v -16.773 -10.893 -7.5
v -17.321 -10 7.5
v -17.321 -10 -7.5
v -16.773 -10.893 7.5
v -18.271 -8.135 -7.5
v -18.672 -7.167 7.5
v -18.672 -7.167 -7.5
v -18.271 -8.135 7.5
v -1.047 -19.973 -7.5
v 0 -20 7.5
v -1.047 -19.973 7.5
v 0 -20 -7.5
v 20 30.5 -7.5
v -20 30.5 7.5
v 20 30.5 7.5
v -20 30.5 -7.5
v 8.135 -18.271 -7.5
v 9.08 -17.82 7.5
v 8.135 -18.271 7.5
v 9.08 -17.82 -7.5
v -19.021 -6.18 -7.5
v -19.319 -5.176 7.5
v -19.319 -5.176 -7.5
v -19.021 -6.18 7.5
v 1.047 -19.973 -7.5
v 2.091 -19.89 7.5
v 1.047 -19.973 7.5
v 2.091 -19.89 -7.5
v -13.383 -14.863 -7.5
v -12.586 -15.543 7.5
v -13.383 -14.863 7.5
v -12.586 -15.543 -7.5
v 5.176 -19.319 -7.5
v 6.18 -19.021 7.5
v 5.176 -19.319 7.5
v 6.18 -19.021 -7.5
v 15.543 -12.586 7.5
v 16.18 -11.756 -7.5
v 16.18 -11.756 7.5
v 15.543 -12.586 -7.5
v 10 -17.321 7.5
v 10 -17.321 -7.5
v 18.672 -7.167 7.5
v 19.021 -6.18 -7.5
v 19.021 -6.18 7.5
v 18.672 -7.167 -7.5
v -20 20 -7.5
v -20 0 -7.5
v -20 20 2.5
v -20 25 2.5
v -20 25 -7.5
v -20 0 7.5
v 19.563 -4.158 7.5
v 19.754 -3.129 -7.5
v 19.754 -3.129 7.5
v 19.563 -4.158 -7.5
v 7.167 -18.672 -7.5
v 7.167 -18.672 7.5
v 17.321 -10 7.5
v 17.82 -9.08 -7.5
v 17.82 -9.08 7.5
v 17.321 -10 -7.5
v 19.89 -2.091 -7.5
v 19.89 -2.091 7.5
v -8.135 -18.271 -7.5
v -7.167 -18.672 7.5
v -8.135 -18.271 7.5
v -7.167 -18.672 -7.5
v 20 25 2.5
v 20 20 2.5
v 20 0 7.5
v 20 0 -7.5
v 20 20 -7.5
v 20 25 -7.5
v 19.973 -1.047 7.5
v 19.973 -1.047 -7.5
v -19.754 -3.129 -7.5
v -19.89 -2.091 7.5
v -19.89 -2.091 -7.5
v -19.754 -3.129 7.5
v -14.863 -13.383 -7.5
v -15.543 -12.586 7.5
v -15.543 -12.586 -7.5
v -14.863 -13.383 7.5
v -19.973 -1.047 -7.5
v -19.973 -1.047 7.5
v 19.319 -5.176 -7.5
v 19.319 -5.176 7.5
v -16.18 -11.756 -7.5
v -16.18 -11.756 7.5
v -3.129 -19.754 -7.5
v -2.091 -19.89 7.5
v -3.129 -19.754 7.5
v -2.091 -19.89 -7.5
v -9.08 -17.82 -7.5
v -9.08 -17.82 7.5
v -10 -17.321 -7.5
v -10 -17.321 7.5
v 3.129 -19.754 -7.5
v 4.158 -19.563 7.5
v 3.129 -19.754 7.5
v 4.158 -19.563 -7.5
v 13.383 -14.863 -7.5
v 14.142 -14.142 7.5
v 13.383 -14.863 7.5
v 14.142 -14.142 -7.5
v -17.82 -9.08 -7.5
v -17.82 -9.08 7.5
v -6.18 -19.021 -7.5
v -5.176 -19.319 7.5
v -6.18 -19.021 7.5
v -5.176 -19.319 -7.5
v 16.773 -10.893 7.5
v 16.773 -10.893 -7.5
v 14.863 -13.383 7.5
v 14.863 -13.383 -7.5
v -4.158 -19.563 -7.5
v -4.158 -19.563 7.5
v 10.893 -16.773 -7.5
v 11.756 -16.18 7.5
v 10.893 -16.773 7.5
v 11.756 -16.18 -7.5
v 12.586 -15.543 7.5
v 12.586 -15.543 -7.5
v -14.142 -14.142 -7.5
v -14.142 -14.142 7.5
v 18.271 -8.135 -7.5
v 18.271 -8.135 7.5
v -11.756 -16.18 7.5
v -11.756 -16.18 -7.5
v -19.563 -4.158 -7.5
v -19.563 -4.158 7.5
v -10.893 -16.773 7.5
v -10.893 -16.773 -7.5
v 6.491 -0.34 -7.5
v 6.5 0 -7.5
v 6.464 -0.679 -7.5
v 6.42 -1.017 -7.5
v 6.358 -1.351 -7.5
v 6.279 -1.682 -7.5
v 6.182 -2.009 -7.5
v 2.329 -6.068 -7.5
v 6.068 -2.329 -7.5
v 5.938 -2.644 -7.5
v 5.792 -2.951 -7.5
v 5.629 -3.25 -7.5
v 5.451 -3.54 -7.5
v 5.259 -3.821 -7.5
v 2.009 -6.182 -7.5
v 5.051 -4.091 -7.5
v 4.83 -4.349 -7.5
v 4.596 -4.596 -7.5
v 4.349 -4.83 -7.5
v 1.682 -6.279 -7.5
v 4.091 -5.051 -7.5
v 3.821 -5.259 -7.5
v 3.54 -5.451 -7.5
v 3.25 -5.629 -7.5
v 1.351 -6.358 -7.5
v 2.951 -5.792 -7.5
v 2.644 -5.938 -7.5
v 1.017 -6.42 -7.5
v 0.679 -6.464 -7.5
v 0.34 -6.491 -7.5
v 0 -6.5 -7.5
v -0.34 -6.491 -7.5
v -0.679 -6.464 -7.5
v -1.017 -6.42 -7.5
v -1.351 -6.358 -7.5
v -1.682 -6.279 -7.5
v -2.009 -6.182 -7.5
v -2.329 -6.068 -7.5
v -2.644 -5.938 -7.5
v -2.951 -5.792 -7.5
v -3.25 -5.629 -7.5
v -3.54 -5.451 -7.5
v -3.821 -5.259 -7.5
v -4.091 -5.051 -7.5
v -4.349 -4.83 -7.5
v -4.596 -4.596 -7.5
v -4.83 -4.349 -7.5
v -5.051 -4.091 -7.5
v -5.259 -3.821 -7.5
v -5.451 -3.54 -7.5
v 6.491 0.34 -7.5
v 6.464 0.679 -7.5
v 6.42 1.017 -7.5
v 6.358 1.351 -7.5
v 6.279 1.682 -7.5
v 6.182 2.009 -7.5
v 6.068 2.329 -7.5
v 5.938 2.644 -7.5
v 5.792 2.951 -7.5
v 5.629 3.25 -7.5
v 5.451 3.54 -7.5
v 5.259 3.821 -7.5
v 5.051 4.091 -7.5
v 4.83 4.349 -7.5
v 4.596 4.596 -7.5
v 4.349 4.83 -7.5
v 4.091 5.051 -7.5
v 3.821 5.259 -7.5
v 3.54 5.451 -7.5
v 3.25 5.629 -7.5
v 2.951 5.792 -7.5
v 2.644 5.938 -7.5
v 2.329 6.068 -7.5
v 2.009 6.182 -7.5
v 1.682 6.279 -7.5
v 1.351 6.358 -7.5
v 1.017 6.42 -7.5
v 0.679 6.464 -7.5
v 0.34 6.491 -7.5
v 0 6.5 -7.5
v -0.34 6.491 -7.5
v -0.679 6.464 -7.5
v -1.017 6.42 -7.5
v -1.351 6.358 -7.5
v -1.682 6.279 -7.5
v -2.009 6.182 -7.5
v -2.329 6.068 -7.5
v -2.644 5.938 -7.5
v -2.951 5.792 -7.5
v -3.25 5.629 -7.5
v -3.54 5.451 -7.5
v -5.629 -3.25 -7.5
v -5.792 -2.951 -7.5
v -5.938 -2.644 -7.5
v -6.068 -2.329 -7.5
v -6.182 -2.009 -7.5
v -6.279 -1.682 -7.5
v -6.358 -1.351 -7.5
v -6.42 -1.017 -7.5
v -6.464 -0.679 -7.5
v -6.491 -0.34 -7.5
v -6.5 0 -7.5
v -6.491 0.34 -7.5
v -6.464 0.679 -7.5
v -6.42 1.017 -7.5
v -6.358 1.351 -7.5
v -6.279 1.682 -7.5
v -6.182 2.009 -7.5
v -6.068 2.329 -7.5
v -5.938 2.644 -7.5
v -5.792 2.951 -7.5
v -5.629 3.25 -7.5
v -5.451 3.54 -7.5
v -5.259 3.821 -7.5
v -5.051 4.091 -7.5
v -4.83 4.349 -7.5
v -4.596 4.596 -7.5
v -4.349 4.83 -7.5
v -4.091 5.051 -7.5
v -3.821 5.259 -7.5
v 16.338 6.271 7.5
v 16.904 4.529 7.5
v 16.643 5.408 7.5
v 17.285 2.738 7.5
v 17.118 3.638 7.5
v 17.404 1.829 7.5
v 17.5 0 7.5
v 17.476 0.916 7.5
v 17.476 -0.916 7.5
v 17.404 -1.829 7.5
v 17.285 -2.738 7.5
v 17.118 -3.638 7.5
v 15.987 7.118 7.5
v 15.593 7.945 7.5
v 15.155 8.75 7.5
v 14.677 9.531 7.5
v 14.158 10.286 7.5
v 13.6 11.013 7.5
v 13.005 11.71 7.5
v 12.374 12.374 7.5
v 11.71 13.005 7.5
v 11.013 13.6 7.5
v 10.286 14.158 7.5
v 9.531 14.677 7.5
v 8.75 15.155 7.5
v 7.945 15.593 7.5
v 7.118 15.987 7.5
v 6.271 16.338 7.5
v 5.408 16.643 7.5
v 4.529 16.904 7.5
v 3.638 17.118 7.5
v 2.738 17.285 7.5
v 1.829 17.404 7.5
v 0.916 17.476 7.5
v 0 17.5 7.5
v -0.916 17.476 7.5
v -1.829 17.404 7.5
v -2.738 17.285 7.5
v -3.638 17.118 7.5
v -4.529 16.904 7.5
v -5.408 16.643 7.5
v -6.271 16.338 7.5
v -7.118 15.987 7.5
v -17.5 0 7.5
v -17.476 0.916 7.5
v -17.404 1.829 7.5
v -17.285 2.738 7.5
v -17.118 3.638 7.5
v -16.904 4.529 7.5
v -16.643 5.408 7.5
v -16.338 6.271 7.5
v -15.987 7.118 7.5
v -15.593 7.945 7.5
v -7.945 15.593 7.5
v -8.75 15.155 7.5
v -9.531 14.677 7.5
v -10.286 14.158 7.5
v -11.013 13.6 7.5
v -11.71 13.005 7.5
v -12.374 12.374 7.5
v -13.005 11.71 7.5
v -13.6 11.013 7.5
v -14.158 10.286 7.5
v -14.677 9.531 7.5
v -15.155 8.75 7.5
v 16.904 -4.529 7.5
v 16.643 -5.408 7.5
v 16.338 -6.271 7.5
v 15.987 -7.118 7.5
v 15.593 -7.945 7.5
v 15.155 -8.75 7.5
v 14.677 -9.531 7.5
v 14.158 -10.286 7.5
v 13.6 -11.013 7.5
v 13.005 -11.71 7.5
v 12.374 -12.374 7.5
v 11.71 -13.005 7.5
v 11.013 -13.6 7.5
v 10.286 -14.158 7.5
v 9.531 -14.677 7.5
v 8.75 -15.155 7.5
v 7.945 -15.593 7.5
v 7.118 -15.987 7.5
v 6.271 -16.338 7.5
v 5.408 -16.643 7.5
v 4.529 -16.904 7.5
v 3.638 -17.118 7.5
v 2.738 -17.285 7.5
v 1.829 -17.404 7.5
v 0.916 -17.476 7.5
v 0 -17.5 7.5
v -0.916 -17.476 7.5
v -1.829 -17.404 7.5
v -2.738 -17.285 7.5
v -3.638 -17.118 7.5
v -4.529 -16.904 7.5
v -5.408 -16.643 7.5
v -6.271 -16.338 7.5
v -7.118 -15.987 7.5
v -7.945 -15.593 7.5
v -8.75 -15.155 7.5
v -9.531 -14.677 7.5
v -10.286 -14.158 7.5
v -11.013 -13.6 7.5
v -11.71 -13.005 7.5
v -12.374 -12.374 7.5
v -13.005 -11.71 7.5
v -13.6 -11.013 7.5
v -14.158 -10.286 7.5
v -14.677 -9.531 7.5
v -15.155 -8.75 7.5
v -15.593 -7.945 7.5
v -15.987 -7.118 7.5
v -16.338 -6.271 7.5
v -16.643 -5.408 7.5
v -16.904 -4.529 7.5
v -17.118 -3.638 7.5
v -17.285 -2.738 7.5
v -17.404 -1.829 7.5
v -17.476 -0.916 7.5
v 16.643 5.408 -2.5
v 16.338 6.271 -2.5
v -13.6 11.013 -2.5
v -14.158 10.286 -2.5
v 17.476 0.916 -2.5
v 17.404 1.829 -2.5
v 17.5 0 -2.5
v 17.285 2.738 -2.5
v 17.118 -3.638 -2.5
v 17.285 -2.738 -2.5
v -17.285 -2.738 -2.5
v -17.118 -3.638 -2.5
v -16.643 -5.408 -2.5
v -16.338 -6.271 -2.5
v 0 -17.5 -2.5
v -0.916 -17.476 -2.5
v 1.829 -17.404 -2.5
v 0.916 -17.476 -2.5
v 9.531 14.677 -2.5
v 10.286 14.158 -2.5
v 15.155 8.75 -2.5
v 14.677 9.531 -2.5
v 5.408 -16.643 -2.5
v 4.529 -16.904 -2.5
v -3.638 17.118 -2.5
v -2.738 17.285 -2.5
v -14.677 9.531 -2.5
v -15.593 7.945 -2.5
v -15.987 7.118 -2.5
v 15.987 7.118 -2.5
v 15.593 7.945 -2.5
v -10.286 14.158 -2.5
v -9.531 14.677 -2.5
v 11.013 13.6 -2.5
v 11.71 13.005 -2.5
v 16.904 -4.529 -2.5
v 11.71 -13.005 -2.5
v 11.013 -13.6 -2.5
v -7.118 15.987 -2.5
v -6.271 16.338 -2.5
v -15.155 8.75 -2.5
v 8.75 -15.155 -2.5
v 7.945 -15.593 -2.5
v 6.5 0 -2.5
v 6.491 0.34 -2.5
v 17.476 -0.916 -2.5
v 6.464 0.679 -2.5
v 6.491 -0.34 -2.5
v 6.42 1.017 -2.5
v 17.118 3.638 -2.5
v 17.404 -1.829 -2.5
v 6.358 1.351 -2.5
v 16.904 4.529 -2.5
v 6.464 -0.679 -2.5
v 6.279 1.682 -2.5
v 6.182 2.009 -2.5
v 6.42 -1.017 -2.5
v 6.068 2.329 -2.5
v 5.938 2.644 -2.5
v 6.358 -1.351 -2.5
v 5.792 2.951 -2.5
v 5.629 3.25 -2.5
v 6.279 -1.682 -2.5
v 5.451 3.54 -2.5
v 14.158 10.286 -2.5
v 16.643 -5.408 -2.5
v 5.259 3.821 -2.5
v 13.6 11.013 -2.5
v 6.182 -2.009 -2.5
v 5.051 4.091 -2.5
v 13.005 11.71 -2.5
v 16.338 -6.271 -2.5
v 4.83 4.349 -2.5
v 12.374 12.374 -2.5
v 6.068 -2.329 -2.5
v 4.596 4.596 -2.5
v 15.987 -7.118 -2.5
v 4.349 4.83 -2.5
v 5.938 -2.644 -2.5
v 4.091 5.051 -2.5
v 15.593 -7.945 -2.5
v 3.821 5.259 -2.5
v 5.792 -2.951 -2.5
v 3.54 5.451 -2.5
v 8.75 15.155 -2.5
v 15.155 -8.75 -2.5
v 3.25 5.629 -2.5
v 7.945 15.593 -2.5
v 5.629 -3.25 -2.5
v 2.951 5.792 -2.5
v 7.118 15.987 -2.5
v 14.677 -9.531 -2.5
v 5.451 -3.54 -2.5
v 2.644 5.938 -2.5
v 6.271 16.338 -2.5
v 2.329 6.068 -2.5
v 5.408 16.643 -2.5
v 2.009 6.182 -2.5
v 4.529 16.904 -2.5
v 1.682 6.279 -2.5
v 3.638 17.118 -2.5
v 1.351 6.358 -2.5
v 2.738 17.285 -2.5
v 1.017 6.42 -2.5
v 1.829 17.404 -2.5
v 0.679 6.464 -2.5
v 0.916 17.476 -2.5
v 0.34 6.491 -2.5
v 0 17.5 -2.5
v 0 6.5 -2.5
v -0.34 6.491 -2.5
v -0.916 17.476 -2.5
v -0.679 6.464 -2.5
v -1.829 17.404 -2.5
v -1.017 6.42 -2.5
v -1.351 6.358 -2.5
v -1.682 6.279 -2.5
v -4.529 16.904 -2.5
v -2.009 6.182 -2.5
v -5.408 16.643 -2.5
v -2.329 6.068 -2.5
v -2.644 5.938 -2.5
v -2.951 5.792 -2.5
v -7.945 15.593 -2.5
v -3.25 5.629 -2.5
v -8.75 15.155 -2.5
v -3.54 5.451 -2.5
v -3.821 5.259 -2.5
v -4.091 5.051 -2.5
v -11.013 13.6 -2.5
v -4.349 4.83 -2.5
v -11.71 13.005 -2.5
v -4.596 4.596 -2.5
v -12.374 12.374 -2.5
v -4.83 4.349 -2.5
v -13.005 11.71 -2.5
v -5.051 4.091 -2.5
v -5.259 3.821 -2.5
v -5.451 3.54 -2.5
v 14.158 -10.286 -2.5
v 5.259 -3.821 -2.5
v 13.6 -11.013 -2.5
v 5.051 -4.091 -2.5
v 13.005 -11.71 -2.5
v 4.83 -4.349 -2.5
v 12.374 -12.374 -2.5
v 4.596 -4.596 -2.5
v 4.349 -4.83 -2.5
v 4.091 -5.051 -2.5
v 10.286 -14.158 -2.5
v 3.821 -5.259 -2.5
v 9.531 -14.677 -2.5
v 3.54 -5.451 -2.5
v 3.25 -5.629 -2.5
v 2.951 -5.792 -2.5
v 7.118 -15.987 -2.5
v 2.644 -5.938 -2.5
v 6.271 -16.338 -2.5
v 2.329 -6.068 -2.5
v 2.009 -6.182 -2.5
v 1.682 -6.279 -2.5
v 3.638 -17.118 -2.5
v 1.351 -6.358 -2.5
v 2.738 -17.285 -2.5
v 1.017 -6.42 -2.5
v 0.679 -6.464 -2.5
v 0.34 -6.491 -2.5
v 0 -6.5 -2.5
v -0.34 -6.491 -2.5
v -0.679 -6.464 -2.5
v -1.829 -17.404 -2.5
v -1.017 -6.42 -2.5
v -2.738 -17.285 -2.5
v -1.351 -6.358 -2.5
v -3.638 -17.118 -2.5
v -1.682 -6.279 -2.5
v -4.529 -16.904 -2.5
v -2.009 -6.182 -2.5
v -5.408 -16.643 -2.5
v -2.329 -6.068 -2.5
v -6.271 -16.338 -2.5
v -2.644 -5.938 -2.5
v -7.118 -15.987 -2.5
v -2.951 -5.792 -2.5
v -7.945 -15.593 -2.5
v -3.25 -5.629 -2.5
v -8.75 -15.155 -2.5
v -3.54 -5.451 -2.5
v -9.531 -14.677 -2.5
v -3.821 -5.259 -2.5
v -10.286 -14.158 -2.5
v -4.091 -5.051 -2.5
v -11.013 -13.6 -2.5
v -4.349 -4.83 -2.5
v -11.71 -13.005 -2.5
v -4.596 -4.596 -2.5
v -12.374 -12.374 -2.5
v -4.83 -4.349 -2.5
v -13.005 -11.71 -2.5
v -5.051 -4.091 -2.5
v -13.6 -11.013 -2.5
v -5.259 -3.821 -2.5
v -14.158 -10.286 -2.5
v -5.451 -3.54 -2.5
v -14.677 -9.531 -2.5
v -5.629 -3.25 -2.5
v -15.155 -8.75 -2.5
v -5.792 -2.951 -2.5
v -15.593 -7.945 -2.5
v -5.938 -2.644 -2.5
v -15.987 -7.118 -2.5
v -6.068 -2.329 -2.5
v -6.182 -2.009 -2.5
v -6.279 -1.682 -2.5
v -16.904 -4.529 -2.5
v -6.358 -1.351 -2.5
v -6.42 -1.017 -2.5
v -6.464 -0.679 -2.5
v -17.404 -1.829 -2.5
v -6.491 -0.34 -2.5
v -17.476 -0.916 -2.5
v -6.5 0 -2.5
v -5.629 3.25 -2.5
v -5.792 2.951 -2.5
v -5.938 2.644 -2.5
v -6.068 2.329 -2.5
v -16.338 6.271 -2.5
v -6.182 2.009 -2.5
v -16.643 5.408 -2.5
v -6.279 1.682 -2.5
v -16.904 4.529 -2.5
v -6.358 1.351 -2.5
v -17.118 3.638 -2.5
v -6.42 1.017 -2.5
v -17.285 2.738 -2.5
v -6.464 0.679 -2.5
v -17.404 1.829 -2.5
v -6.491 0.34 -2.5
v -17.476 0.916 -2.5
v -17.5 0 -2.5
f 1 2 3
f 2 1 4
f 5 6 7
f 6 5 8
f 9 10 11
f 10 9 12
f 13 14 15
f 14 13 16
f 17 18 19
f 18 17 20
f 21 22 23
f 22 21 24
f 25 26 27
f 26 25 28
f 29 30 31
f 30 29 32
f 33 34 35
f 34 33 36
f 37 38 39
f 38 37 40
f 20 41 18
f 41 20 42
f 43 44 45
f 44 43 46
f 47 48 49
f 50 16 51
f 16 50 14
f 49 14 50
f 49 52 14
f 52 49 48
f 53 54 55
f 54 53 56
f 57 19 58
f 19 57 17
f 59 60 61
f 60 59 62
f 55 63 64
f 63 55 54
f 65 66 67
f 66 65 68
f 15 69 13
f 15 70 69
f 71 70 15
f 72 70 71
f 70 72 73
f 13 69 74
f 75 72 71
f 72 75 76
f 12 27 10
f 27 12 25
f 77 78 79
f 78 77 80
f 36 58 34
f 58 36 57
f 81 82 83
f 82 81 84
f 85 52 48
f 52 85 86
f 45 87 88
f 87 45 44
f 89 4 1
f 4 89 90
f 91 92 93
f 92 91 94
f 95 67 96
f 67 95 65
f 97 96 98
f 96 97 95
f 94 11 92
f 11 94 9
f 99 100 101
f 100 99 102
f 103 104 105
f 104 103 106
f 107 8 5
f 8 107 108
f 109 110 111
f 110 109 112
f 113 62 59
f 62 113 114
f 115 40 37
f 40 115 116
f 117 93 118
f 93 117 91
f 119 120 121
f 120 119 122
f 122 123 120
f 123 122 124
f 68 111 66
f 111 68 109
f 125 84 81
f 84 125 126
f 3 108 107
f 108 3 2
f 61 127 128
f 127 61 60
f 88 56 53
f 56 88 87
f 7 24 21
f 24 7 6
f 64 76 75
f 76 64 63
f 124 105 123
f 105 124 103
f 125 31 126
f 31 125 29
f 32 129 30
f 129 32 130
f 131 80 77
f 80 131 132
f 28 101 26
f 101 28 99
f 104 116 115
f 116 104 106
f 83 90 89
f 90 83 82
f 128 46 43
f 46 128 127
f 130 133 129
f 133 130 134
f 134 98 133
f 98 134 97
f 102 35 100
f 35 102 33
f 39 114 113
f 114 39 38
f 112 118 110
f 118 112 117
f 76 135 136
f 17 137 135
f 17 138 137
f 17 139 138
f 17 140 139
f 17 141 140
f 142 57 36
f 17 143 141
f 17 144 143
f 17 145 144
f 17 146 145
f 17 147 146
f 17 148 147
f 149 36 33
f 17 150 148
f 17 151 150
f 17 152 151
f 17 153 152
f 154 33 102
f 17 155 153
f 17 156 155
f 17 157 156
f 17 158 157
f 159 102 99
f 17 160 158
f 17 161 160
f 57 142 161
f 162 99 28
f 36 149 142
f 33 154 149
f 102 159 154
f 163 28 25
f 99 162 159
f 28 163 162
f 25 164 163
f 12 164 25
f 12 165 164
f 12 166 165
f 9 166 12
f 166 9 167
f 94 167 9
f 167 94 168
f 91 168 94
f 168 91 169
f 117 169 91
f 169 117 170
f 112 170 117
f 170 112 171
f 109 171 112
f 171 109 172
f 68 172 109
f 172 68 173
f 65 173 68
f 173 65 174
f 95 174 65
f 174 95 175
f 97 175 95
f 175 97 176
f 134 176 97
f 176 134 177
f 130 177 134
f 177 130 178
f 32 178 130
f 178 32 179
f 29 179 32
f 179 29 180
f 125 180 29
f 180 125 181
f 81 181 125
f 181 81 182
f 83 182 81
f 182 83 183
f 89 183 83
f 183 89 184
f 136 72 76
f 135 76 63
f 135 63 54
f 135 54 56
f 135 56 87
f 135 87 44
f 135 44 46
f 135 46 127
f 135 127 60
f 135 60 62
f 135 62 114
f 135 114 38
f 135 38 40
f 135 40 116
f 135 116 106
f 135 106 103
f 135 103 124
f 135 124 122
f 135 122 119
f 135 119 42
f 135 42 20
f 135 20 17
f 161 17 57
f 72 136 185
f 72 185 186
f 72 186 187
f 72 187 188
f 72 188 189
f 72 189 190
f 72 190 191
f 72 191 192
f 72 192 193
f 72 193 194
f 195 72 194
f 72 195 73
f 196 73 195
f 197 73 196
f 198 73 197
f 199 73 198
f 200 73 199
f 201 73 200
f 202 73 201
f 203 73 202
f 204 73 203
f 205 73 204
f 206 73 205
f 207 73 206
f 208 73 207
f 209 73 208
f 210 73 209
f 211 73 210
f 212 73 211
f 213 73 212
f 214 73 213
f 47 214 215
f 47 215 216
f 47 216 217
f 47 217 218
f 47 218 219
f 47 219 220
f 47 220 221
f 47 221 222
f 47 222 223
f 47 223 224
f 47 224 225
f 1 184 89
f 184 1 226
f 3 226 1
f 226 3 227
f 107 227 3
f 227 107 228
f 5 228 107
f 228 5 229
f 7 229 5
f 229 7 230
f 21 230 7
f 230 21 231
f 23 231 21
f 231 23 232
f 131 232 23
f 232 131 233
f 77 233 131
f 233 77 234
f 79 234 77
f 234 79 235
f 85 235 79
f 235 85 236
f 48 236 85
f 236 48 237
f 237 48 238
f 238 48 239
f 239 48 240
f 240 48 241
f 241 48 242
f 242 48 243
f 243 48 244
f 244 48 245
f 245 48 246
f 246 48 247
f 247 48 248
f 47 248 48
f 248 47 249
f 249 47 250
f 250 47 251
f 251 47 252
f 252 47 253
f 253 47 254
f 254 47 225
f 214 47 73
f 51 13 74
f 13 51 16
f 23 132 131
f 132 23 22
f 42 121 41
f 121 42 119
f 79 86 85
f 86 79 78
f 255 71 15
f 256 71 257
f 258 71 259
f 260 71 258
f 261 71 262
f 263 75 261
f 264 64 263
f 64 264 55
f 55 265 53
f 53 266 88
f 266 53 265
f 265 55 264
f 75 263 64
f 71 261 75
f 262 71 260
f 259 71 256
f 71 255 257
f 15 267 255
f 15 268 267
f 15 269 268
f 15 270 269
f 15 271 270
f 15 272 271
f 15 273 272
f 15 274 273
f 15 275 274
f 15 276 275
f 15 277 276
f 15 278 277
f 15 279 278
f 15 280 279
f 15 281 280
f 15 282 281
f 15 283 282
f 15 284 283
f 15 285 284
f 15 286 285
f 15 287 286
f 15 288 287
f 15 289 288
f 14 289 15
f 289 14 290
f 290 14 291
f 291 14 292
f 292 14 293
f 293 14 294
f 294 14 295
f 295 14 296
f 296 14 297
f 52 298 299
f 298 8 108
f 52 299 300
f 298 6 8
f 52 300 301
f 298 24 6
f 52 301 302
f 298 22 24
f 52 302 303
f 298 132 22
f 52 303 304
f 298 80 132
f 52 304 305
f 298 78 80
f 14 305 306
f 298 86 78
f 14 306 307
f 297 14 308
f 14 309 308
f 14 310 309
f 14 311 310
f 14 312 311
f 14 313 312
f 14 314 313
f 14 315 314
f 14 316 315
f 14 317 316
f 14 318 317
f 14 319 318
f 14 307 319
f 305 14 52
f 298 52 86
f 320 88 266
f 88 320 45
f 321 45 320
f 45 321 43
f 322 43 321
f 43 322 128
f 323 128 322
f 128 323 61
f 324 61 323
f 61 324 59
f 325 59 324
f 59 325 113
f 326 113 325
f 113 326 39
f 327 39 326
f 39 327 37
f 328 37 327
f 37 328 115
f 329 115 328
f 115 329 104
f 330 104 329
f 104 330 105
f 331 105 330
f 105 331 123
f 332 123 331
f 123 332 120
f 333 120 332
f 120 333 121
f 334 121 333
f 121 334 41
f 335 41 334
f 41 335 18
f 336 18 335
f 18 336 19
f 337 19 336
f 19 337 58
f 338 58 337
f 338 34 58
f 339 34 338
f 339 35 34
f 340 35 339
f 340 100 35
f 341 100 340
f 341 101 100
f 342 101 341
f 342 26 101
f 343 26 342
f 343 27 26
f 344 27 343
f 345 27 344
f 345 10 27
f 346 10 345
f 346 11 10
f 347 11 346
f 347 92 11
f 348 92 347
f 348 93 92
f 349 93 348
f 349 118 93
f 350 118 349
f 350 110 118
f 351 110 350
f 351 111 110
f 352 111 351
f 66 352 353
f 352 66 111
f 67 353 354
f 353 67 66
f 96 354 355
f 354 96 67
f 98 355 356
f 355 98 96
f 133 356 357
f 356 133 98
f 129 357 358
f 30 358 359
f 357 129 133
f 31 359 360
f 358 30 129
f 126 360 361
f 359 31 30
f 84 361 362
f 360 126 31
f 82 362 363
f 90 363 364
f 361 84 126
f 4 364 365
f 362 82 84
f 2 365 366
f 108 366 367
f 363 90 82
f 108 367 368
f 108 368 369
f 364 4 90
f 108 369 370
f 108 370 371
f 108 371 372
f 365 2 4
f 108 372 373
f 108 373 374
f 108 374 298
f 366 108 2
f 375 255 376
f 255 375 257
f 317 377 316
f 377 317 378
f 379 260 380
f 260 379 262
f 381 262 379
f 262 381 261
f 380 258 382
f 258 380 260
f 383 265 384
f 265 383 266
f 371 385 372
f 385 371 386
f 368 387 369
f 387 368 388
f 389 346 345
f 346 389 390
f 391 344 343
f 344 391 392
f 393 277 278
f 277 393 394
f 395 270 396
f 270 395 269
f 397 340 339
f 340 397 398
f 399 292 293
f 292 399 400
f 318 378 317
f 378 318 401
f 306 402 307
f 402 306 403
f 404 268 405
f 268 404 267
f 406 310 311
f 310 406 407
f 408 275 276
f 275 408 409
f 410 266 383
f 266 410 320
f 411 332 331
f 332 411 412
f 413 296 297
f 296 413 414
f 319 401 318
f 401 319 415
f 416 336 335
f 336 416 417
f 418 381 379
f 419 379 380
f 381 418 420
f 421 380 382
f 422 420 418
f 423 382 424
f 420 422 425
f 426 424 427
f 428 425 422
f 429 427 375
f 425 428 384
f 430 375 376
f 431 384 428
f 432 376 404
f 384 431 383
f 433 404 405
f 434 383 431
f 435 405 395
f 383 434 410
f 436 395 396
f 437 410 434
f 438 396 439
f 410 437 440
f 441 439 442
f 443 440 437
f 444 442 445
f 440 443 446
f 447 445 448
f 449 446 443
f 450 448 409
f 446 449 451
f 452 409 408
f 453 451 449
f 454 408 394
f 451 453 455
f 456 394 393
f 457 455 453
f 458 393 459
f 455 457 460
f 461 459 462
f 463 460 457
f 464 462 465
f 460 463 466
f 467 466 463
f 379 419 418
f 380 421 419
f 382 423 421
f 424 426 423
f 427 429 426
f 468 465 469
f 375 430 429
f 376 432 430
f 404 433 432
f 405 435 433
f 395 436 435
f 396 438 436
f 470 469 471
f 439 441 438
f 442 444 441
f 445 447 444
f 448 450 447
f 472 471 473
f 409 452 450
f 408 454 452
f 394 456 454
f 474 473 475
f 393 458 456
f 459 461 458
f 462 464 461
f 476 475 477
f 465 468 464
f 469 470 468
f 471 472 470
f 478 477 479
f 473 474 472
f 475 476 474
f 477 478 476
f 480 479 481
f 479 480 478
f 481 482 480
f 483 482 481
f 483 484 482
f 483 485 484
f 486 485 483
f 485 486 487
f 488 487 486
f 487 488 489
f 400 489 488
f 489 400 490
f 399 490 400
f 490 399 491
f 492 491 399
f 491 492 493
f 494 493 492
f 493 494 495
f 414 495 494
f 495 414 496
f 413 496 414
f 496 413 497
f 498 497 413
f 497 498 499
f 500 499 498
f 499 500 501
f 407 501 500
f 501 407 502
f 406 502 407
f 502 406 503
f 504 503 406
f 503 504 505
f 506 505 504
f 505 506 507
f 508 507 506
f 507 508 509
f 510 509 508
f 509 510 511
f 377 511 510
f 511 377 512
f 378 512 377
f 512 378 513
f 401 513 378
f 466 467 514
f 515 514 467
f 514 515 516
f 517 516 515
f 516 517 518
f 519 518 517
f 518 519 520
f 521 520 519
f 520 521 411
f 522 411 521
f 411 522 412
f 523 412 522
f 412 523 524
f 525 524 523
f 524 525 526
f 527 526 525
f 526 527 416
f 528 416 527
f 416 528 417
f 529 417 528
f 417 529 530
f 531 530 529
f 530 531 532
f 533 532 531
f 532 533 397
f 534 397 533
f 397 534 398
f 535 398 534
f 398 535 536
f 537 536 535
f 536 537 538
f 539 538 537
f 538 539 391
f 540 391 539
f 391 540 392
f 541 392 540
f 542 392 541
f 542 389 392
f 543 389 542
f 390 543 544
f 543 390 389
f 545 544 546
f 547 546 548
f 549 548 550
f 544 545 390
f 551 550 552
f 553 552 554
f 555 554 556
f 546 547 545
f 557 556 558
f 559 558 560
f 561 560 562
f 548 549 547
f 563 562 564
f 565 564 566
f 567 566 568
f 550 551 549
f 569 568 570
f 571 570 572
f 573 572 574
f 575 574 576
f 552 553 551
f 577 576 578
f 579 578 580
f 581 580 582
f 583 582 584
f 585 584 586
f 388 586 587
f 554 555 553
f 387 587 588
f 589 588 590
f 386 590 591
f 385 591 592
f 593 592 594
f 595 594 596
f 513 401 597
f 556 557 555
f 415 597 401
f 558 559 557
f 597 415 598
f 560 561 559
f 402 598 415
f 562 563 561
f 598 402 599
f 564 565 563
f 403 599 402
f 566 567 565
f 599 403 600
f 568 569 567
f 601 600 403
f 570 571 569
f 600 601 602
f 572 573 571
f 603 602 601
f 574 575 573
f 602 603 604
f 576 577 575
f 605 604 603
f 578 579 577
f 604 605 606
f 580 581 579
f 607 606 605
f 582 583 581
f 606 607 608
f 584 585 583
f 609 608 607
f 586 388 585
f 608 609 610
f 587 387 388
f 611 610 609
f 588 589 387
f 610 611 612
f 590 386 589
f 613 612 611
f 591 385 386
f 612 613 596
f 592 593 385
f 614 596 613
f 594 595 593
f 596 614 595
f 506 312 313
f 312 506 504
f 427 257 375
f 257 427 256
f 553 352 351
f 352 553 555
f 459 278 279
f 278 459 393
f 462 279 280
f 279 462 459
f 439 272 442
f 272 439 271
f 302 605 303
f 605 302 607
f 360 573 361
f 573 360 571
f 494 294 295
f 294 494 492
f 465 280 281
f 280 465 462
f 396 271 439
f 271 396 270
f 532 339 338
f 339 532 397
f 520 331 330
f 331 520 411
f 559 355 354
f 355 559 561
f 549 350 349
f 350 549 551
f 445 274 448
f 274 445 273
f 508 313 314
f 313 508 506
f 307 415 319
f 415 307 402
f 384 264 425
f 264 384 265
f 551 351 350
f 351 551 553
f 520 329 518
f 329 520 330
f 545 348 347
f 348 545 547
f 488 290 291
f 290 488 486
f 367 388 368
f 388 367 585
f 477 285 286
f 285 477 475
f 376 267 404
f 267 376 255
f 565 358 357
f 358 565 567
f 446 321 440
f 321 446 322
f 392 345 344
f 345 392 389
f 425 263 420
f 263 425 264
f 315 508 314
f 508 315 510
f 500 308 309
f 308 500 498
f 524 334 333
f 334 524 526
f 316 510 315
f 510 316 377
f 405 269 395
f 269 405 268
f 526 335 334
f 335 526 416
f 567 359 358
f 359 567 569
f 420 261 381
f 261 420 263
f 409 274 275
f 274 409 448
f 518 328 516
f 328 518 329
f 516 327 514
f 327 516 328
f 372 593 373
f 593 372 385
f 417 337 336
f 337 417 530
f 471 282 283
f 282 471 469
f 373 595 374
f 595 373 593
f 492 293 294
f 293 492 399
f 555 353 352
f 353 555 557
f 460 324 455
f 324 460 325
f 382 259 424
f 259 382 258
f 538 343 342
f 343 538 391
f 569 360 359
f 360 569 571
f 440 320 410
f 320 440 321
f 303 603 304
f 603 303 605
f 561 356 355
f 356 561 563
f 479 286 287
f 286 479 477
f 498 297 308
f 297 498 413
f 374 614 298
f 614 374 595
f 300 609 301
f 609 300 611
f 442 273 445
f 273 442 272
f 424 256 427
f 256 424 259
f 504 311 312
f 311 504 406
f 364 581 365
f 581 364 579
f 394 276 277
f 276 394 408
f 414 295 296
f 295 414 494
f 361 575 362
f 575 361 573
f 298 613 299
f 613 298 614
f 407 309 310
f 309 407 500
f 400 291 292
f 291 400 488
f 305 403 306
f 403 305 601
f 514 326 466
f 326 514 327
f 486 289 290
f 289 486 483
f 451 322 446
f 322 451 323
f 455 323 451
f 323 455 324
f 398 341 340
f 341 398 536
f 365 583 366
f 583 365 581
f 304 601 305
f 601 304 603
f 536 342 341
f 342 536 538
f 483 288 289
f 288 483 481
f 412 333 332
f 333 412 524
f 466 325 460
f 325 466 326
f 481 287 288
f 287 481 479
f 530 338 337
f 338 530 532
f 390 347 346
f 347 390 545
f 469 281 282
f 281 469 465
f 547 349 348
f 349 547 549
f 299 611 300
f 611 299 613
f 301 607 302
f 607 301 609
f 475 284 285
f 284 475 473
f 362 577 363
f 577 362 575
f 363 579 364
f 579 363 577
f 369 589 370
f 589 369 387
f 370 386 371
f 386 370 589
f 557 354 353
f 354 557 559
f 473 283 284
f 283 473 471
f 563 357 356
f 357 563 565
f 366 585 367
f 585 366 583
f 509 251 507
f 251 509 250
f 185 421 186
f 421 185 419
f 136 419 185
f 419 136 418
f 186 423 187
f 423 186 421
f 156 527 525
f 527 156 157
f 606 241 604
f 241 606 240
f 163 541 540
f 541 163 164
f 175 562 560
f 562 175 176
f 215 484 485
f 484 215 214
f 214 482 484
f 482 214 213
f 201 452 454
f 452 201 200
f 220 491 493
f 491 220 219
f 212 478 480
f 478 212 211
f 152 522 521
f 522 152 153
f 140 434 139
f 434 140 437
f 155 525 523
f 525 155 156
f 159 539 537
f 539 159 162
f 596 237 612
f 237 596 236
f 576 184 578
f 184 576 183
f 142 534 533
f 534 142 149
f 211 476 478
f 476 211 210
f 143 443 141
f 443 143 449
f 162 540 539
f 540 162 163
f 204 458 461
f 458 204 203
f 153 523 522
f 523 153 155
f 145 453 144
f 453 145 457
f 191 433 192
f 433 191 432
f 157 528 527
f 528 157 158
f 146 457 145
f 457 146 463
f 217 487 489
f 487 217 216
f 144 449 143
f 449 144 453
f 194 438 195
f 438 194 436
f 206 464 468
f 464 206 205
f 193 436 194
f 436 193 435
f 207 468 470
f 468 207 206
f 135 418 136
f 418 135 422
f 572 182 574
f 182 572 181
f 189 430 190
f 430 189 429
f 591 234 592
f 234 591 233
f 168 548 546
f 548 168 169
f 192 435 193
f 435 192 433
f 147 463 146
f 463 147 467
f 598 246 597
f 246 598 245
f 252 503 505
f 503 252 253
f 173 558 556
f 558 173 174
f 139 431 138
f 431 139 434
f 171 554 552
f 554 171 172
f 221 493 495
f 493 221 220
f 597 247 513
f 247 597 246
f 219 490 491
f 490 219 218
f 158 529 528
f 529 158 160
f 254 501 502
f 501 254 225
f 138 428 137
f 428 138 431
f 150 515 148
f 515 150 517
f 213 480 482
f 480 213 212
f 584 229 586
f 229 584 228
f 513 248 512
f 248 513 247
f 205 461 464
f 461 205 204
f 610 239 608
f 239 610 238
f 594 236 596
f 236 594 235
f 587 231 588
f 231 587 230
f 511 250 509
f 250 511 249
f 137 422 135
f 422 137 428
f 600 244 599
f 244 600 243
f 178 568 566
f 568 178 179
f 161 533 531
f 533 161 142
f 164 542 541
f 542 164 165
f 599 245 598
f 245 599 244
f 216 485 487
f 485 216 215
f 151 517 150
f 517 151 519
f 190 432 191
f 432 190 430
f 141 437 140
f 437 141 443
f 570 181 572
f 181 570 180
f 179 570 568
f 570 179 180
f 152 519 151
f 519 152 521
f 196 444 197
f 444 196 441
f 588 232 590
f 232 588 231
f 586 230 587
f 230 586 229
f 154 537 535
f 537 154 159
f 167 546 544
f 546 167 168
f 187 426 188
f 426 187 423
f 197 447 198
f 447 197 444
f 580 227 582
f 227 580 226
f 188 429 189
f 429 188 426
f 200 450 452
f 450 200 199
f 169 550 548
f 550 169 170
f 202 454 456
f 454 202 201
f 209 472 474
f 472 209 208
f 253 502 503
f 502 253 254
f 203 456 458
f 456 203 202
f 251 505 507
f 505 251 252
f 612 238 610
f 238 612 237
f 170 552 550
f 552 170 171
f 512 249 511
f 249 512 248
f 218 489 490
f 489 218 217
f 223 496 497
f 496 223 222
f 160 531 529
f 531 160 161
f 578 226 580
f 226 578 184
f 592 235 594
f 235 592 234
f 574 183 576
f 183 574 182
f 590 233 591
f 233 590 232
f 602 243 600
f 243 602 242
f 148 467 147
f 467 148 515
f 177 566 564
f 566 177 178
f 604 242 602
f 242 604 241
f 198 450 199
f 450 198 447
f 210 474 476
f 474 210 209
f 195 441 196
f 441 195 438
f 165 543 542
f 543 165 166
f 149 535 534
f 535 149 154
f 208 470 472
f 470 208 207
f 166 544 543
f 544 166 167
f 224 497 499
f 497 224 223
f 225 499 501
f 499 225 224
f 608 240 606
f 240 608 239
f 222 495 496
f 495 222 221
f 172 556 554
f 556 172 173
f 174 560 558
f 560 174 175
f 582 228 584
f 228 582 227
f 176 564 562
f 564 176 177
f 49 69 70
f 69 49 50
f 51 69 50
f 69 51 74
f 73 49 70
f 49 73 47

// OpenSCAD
$fn=120;

//spacer();
air_lock_holder();

module spacer(){
    difference(){
        cylinder(d=55, h=25, center=true);
        cylinder(d=38.5, h=27, center=true);
    }
}

module air_lock_holder(){
    difference(){
        hull(){
            cylinder(d=40, h=15, center=true);
            translate([0,30,0]) cube([40,1,15], center=true);
        }
        translate([0,0,5]) cylinder(d=35, h=15, center=true);
        translate([0,0,-5]) cylinder(d=13, h=7.5, center=true);
        
        translate([0,22.5,-5]) cube([45, 5, 15],center=true);
//        %hull(){
//            translate([0,22.5,2.5]) rotate([0,90,0]) 
//                cylinder(d=5, h=45, center=true);
//            translate([0,22.5,-10]) rotate([0,90,0]) 
//                cylinder(d=5, h=45, center=true);
//        }
    }
}
